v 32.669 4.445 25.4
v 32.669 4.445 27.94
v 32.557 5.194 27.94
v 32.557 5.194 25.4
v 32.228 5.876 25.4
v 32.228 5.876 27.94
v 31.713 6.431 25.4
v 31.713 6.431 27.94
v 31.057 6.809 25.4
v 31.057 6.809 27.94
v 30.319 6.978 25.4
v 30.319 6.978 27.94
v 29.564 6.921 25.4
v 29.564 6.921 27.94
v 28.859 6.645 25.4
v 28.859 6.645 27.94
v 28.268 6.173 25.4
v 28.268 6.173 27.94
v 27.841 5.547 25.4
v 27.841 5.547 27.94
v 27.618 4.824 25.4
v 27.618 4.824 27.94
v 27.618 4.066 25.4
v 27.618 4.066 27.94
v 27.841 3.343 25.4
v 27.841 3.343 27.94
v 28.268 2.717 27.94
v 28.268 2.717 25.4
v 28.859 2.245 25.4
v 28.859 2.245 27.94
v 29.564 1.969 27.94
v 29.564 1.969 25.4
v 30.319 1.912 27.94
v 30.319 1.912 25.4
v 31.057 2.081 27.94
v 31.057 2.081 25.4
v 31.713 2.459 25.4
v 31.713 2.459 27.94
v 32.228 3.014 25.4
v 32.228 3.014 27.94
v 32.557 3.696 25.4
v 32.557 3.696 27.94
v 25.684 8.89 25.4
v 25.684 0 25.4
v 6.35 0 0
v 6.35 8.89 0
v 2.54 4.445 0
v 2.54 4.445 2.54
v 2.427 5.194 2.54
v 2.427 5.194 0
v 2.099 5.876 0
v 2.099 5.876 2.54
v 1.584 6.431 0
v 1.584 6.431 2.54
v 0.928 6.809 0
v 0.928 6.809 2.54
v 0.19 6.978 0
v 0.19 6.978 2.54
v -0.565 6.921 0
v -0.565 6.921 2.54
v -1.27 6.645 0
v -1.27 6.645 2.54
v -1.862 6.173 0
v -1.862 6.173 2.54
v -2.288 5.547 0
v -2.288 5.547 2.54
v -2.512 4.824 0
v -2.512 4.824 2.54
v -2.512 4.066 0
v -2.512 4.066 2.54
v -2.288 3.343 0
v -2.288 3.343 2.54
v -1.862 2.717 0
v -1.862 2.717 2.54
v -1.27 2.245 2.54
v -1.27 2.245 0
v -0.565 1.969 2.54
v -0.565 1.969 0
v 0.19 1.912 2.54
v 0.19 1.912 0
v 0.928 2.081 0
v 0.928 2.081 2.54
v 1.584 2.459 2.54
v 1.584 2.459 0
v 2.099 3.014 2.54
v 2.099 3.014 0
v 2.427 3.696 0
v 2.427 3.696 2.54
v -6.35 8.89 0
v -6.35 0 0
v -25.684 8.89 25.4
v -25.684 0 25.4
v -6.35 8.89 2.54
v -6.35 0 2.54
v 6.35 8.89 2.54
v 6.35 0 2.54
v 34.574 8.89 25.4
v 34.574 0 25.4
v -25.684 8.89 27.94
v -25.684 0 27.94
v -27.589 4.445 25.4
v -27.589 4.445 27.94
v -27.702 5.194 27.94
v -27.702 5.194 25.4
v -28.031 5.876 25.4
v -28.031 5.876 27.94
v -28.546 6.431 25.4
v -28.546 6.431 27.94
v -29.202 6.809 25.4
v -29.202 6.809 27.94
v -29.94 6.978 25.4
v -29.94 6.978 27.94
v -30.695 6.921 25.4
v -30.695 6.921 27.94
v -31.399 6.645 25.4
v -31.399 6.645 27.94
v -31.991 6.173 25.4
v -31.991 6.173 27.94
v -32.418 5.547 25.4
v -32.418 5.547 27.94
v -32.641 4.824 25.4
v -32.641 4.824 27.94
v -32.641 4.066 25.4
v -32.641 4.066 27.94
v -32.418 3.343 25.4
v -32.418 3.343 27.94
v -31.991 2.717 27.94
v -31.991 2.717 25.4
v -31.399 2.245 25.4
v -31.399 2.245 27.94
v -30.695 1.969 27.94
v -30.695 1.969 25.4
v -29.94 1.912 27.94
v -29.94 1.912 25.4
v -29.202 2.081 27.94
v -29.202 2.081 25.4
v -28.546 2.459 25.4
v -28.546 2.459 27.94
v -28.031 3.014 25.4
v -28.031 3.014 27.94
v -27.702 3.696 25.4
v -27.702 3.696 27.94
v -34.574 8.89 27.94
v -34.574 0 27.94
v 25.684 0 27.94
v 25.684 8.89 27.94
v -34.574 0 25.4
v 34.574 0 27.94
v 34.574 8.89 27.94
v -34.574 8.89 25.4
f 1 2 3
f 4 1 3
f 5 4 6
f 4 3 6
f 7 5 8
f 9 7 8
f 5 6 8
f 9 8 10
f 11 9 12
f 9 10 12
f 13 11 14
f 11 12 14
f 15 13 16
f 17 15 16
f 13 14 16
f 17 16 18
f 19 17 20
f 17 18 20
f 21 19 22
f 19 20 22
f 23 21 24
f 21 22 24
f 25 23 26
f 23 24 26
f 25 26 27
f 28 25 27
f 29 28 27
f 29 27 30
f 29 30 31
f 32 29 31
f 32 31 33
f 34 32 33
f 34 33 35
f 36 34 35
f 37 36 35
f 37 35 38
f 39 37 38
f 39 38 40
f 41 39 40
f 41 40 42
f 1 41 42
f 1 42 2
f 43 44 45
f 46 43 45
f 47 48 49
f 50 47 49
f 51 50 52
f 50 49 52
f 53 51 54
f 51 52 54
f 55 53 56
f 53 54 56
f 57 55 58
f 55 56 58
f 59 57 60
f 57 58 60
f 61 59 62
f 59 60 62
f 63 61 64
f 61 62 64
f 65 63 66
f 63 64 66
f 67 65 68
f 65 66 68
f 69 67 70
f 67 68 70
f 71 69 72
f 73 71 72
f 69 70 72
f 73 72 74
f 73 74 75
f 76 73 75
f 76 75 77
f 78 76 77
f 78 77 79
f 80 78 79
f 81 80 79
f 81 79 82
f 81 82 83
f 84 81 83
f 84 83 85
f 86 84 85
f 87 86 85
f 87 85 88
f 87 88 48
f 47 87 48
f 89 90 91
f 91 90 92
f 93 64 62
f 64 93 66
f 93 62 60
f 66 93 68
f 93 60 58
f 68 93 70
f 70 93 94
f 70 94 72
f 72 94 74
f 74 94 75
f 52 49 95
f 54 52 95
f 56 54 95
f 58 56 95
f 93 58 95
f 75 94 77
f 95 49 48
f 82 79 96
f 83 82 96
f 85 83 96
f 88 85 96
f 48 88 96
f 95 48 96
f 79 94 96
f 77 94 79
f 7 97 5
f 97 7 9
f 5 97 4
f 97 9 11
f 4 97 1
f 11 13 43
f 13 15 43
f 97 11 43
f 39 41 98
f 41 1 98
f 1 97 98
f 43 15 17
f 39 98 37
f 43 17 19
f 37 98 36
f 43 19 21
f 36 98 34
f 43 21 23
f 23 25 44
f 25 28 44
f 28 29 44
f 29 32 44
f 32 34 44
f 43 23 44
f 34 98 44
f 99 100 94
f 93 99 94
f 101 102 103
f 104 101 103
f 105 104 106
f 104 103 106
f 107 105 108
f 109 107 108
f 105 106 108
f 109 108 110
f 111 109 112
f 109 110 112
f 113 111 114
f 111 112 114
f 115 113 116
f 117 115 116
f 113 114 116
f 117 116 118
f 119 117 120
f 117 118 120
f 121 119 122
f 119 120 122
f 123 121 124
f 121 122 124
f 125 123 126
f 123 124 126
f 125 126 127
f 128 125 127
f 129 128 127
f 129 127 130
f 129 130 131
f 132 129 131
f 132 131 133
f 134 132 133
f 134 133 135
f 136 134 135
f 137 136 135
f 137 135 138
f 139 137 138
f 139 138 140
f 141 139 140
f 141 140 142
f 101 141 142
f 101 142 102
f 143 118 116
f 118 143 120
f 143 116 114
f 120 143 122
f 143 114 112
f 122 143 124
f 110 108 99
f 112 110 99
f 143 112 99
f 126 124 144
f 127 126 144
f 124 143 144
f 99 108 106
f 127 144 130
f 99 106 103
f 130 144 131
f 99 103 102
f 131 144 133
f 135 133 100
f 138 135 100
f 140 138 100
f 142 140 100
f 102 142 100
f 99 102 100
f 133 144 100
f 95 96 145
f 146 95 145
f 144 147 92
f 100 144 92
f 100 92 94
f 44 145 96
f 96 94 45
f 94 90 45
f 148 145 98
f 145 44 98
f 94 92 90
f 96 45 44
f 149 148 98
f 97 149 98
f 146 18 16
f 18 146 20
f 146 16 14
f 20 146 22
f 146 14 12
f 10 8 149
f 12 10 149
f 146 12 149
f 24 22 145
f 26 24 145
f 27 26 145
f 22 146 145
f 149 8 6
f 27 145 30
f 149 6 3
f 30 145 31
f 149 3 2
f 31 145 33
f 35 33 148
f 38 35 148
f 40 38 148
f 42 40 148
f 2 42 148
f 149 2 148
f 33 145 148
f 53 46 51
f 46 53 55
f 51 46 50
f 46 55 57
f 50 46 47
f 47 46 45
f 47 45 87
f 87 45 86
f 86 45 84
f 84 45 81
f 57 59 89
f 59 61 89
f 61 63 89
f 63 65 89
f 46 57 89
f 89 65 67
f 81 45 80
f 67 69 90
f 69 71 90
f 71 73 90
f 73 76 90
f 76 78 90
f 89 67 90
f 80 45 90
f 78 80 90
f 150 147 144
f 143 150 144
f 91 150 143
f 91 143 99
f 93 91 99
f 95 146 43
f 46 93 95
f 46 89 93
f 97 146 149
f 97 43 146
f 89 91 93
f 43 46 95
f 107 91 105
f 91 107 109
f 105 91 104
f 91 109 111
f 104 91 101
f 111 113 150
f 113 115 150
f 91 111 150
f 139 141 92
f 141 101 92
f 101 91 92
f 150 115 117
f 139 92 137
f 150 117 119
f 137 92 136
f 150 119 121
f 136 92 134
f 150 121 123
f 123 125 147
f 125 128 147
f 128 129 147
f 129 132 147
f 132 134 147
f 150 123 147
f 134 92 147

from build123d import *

# Parameters (mm, degrees)
BOSS_EXTRUDE1_DEPTH = 8.89
SKETCH2_R           = 2.54
CUT_EXTRUDE1_DEPTH  = 28.94
SKETCH3_R           = 2.54
CUT_EXTRUDE2_DEPTH  = 28.94
SKETCH4_R           = 2.54
CUT_EXTRUDE3_DEPTH  = 8.89


with BuildPart() as part:
    # Sketch1 → Boss-Extrude1 (new body)
    with BuildSketch(Plane(origin=(0, 0, 0), x_dir=(1, 0, 0), z_dir=(0, 1, 0))):
        Polygon((6.35, 0), (-6.35, 0), (-25.68448, -25.4), (-34.57448, -25.4), (-34.57448, -27.94), (-25.68448, -27.94), (-6.35, -2.54), (6.35, -2.54), (25.68448, -27.94), (34.57448, -27.94), (34.57448, -25.4), (25.68448, -25.4), align=None)
    extrude(amount=BOSS_EXTRUDE1_DEPTH)

    # Sketch2 → Cut-Extrude1 (cut, through all)
    with BuildSketch(Plane.XY.offset(27.94)):
        with Locations((-30.12948, 4.445)):
            Circle(SKETCH2_R)
    extrude(amount=-CUT_EXTRUDE1_DEPTH, mode=Mode.SUBTRACT)

    # Sketch3 → Cut-Extrude2 (cut, through all)
    with BuildSketch(Plane.XY.offset(27.94)):
        with Locations((30.12948, 4.445)):
            Circle(SKETCH3_R)
    extrude(amount=-CUT_EXTRUDE2_DEPTH, mode=Mode.SUBTRACT)

    # Sketch4 → Cut-Extrude3 (cut)
    with BuildSketch(Plane.XY.offset(2.54)):
        with Locations((0, 4.445)):
            Circle(SKETCH4_R)
    extrude(amount=-CUT_EXTRUDE3_DEPTH, mode=Mode.SUBTRACT)


solid = part.part
